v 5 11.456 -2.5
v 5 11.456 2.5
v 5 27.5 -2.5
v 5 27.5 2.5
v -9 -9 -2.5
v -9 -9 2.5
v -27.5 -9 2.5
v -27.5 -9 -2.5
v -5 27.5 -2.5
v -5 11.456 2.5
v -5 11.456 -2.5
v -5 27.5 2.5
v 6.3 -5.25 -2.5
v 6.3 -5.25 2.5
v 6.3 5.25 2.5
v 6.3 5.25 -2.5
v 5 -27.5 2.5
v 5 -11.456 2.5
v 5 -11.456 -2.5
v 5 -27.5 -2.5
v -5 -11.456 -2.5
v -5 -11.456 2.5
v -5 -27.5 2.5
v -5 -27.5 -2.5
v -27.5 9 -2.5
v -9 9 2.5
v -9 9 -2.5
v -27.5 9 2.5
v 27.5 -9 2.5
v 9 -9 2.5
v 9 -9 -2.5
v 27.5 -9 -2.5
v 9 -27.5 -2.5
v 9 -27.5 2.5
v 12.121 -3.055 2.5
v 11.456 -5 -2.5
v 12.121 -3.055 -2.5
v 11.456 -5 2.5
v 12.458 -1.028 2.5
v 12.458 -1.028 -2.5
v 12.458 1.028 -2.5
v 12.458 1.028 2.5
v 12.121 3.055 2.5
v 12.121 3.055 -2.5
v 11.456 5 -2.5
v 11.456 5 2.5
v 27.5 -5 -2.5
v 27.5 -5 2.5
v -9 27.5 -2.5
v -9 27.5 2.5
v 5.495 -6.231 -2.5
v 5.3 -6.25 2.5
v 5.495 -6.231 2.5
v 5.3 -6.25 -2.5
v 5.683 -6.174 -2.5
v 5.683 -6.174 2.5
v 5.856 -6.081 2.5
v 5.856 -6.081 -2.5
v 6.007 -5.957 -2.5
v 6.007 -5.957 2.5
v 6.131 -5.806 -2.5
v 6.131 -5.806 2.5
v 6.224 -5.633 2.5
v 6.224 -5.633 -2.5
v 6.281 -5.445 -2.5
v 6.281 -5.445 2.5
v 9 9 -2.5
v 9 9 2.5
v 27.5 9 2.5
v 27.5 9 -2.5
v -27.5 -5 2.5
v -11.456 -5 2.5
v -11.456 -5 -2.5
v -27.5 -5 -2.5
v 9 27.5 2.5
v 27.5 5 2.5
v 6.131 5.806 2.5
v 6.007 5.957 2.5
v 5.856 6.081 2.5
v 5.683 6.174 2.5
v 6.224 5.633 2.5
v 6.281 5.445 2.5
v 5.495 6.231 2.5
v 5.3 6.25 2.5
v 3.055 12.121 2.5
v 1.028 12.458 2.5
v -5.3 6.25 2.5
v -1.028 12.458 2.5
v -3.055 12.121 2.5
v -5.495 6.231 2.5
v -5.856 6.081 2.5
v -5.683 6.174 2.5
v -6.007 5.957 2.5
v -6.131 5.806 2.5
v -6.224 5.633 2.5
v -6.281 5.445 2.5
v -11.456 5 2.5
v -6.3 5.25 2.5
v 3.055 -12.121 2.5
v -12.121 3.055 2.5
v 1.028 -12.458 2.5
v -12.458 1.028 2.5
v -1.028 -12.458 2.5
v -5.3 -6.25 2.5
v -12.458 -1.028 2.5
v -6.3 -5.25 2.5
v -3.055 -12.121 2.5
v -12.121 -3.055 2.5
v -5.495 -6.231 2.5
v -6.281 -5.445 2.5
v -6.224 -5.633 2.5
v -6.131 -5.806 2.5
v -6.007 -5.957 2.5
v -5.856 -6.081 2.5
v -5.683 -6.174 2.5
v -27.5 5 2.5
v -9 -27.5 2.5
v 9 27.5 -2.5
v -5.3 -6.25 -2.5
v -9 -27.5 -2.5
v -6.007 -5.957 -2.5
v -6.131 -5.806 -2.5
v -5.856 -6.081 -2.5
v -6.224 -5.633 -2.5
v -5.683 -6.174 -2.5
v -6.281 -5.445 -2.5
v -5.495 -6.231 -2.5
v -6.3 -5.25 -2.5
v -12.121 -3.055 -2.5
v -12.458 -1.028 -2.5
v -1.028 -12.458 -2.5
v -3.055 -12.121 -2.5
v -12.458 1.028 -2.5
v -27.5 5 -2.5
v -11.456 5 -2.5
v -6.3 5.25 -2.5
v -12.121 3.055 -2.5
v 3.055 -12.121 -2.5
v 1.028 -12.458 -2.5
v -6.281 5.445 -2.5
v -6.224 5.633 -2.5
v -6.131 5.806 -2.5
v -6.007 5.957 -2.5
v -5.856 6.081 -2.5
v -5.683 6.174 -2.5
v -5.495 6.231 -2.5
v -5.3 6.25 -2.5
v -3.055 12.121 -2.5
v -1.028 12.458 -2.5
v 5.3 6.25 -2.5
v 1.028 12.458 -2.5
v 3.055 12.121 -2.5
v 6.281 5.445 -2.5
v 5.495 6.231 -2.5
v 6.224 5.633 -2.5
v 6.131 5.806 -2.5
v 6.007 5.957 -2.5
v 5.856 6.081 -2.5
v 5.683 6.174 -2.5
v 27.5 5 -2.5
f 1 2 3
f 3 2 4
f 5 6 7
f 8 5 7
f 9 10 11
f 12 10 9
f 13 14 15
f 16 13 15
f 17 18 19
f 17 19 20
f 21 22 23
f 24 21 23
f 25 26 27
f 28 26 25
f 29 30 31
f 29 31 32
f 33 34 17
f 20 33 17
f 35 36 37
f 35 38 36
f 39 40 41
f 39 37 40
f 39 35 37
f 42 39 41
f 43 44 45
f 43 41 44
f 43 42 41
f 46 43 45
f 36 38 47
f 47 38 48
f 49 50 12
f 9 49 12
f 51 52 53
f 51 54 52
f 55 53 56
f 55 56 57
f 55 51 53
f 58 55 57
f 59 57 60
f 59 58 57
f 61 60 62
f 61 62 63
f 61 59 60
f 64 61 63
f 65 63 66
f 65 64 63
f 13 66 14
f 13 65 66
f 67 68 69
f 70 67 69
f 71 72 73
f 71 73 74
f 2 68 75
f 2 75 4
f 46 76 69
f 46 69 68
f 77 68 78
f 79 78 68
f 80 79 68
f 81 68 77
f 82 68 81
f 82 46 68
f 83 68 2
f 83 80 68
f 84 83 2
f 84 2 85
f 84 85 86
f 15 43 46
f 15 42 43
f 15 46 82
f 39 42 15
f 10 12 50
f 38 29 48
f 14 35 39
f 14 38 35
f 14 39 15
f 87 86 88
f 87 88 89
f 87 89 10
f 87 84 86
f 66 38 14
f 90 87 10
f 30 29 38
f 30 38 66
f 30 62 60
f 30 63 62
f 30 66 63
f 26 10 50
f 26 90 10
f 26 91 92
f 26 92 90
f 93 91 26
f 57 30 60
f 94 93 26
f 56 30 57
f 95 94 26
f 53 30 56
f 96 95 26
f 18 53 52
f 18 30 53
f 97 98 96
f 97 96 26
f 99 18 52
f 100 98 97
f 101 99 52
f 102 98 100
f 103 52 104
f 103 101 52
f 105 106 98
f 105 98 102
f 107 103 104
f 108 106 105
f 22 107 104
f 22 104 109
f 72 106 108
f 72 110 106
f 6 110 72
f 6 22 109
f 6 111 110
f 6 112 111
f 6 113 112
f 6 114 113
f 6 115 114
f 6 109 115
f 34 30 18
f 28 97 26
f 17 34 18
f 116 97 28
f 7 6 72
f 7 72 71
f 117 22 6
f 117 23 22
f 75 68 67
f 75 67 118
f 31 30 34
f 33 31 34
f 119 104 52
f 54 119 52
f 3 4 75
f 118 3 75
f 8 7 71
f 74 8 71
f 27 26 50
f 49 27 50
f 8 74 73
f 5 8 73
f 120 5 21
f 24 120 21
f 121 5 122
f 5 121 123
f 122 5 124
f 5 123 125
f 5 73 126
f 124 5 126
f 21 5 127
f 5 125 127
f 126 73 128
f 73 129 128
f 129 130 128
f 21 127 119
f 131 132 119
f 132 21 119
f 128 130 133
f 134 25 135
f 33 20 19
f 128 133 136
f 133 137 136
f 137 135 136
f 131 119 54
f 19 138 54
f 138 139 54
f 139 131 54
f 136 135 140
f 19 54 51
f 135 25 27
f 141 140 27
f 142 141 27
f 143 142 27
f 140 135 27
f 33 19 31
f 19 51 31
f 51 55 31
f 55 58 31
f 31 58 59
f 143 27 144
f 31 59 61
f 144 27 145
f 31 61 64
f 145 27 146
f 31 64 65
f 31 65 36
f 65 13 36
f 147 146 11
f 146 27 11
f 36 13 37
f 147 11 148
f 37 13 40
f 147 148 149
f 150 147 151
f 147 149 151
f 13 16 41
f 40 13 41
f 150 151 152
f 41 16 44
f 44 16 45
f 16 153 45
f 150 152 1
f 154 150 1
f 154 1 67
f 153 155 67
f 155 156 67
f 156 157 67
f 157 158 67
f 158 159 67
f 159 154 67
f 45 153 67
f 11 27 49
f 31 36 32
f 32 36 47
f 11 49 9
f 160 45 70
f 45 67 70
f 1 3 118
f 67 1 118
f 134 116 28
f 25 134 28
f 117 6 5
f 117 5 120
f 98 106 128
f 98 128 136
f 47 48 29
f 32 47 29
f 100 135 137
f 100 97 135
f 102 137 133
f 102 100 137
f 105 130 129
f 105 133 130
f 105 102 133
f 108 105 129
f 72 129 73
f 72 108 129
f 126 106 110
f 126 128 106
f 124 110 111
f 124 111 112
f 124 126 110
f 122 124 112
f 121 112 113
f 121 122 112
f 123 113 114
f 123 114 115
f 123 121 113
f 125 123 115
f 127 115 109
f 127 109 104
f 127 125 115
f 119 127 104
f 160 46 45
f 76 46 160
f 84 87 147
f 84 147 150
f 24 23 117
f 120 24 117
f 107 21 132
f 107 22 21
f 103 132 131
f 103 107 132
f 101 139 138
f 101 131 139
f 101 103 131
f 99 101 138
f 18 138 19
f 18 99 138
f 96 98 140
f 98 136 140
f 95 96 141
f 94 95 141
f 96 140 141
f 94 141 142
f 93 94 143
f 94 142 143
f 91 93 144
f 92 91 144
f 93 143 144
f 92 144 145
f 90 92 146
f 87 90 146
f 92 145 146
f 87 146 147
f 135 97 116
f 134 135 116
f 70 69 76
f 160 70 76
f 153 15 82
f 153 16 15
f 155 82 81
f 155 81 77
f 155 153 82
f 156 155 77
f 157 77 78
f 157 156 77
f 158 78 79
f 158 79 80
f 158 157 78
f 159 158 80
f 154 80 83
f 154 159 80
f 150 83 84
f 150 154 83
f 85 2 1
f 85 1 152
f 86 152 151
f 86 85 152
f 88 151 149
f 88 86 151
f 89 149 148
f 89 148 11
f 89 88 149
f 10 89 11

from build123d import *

# Parameters (mm, degrees)
SKETCH1_R           = 12.5
BOSS_EXTRUDE1_DEPTH = 2.5
SKETCH4_W           = 4
SKETCH4_H           = 27.5
BOSS_EXTRUDE3_DEPTH = 5
CIRPATTERN7_COUNT   = 4
CUT_EXTRUDE3_REACH  = 41.211
SKETCH8_W           = 12.6
SKETCH8_H           = 12.5
FILLET1_R           = 1


with BuildPart() as part:
    # Sketch1 → Boss-Extrude1 (new, symmetric)
    with BuildSketch(Plane.XY):
        Circle(SKETCH1_R)
    extrude(amount=BOSS_EXTRUDE1_DEPTH, both=True)

    # Sketch4 → Boss-Extrude3 (add)
    with BuildSketch(Plane.XY.offset(2.5)):
        with Locations((-7, 13.75)):
            Rectangle(SKETCH4_W, SKETCH4_H)
        with Locations((7, 13.75)):
            Rectangle(SKETCH4_W, SKETCH4_H)
    boss_extrude3 = extrude(amount=-BOSS_EXTRUDE3_DEPTH)

    # CirPattern7: Boss-Extrude3 ×4 about axis
    cirpattern7_axis = Axis((0, 0, 0), (0, 0, 1))
    for i in range(1, CIRPATTERN7_COUNT):
        add(boss_extrude3.rotate(cirpattern7_axis, i * 360 / CIRPATTERN7_COUNT))

    # Sketch8 → Cut-Extrude3 (cut, up to next)
    with BuildSketch(Plane.XY.offset(2.5), mode=Mode.PRIVATE) as cut_extrude3_sk1:
        Rectangle(SKETCH8_W, SKETCH8_H)
    cut_extrude3_tool1 = extrude(cut_extrude3_sk1.sketch, amount=-CUT_EXTRUDE3_REACH, mode=Mode.PRIVATE) & part.part
    add(cut_extrude3_tool1.solids().sort_by_distance((0, 0, 2.5))[0], mode=Mode.SUBTRACT)

    # Fillet1
    fillet1_edges = [part.edges().sort_by_distance(p)[0] for p in [
        (6.3, 6.25, 0),
        (6.3, -6.25, 0),
        (-6.3, -6.25, 0),
        (-6.3, 6.25, 0),
    ]]
    fillet(fillet1_edges, radius=FILLET1_R)


solid = part.part
